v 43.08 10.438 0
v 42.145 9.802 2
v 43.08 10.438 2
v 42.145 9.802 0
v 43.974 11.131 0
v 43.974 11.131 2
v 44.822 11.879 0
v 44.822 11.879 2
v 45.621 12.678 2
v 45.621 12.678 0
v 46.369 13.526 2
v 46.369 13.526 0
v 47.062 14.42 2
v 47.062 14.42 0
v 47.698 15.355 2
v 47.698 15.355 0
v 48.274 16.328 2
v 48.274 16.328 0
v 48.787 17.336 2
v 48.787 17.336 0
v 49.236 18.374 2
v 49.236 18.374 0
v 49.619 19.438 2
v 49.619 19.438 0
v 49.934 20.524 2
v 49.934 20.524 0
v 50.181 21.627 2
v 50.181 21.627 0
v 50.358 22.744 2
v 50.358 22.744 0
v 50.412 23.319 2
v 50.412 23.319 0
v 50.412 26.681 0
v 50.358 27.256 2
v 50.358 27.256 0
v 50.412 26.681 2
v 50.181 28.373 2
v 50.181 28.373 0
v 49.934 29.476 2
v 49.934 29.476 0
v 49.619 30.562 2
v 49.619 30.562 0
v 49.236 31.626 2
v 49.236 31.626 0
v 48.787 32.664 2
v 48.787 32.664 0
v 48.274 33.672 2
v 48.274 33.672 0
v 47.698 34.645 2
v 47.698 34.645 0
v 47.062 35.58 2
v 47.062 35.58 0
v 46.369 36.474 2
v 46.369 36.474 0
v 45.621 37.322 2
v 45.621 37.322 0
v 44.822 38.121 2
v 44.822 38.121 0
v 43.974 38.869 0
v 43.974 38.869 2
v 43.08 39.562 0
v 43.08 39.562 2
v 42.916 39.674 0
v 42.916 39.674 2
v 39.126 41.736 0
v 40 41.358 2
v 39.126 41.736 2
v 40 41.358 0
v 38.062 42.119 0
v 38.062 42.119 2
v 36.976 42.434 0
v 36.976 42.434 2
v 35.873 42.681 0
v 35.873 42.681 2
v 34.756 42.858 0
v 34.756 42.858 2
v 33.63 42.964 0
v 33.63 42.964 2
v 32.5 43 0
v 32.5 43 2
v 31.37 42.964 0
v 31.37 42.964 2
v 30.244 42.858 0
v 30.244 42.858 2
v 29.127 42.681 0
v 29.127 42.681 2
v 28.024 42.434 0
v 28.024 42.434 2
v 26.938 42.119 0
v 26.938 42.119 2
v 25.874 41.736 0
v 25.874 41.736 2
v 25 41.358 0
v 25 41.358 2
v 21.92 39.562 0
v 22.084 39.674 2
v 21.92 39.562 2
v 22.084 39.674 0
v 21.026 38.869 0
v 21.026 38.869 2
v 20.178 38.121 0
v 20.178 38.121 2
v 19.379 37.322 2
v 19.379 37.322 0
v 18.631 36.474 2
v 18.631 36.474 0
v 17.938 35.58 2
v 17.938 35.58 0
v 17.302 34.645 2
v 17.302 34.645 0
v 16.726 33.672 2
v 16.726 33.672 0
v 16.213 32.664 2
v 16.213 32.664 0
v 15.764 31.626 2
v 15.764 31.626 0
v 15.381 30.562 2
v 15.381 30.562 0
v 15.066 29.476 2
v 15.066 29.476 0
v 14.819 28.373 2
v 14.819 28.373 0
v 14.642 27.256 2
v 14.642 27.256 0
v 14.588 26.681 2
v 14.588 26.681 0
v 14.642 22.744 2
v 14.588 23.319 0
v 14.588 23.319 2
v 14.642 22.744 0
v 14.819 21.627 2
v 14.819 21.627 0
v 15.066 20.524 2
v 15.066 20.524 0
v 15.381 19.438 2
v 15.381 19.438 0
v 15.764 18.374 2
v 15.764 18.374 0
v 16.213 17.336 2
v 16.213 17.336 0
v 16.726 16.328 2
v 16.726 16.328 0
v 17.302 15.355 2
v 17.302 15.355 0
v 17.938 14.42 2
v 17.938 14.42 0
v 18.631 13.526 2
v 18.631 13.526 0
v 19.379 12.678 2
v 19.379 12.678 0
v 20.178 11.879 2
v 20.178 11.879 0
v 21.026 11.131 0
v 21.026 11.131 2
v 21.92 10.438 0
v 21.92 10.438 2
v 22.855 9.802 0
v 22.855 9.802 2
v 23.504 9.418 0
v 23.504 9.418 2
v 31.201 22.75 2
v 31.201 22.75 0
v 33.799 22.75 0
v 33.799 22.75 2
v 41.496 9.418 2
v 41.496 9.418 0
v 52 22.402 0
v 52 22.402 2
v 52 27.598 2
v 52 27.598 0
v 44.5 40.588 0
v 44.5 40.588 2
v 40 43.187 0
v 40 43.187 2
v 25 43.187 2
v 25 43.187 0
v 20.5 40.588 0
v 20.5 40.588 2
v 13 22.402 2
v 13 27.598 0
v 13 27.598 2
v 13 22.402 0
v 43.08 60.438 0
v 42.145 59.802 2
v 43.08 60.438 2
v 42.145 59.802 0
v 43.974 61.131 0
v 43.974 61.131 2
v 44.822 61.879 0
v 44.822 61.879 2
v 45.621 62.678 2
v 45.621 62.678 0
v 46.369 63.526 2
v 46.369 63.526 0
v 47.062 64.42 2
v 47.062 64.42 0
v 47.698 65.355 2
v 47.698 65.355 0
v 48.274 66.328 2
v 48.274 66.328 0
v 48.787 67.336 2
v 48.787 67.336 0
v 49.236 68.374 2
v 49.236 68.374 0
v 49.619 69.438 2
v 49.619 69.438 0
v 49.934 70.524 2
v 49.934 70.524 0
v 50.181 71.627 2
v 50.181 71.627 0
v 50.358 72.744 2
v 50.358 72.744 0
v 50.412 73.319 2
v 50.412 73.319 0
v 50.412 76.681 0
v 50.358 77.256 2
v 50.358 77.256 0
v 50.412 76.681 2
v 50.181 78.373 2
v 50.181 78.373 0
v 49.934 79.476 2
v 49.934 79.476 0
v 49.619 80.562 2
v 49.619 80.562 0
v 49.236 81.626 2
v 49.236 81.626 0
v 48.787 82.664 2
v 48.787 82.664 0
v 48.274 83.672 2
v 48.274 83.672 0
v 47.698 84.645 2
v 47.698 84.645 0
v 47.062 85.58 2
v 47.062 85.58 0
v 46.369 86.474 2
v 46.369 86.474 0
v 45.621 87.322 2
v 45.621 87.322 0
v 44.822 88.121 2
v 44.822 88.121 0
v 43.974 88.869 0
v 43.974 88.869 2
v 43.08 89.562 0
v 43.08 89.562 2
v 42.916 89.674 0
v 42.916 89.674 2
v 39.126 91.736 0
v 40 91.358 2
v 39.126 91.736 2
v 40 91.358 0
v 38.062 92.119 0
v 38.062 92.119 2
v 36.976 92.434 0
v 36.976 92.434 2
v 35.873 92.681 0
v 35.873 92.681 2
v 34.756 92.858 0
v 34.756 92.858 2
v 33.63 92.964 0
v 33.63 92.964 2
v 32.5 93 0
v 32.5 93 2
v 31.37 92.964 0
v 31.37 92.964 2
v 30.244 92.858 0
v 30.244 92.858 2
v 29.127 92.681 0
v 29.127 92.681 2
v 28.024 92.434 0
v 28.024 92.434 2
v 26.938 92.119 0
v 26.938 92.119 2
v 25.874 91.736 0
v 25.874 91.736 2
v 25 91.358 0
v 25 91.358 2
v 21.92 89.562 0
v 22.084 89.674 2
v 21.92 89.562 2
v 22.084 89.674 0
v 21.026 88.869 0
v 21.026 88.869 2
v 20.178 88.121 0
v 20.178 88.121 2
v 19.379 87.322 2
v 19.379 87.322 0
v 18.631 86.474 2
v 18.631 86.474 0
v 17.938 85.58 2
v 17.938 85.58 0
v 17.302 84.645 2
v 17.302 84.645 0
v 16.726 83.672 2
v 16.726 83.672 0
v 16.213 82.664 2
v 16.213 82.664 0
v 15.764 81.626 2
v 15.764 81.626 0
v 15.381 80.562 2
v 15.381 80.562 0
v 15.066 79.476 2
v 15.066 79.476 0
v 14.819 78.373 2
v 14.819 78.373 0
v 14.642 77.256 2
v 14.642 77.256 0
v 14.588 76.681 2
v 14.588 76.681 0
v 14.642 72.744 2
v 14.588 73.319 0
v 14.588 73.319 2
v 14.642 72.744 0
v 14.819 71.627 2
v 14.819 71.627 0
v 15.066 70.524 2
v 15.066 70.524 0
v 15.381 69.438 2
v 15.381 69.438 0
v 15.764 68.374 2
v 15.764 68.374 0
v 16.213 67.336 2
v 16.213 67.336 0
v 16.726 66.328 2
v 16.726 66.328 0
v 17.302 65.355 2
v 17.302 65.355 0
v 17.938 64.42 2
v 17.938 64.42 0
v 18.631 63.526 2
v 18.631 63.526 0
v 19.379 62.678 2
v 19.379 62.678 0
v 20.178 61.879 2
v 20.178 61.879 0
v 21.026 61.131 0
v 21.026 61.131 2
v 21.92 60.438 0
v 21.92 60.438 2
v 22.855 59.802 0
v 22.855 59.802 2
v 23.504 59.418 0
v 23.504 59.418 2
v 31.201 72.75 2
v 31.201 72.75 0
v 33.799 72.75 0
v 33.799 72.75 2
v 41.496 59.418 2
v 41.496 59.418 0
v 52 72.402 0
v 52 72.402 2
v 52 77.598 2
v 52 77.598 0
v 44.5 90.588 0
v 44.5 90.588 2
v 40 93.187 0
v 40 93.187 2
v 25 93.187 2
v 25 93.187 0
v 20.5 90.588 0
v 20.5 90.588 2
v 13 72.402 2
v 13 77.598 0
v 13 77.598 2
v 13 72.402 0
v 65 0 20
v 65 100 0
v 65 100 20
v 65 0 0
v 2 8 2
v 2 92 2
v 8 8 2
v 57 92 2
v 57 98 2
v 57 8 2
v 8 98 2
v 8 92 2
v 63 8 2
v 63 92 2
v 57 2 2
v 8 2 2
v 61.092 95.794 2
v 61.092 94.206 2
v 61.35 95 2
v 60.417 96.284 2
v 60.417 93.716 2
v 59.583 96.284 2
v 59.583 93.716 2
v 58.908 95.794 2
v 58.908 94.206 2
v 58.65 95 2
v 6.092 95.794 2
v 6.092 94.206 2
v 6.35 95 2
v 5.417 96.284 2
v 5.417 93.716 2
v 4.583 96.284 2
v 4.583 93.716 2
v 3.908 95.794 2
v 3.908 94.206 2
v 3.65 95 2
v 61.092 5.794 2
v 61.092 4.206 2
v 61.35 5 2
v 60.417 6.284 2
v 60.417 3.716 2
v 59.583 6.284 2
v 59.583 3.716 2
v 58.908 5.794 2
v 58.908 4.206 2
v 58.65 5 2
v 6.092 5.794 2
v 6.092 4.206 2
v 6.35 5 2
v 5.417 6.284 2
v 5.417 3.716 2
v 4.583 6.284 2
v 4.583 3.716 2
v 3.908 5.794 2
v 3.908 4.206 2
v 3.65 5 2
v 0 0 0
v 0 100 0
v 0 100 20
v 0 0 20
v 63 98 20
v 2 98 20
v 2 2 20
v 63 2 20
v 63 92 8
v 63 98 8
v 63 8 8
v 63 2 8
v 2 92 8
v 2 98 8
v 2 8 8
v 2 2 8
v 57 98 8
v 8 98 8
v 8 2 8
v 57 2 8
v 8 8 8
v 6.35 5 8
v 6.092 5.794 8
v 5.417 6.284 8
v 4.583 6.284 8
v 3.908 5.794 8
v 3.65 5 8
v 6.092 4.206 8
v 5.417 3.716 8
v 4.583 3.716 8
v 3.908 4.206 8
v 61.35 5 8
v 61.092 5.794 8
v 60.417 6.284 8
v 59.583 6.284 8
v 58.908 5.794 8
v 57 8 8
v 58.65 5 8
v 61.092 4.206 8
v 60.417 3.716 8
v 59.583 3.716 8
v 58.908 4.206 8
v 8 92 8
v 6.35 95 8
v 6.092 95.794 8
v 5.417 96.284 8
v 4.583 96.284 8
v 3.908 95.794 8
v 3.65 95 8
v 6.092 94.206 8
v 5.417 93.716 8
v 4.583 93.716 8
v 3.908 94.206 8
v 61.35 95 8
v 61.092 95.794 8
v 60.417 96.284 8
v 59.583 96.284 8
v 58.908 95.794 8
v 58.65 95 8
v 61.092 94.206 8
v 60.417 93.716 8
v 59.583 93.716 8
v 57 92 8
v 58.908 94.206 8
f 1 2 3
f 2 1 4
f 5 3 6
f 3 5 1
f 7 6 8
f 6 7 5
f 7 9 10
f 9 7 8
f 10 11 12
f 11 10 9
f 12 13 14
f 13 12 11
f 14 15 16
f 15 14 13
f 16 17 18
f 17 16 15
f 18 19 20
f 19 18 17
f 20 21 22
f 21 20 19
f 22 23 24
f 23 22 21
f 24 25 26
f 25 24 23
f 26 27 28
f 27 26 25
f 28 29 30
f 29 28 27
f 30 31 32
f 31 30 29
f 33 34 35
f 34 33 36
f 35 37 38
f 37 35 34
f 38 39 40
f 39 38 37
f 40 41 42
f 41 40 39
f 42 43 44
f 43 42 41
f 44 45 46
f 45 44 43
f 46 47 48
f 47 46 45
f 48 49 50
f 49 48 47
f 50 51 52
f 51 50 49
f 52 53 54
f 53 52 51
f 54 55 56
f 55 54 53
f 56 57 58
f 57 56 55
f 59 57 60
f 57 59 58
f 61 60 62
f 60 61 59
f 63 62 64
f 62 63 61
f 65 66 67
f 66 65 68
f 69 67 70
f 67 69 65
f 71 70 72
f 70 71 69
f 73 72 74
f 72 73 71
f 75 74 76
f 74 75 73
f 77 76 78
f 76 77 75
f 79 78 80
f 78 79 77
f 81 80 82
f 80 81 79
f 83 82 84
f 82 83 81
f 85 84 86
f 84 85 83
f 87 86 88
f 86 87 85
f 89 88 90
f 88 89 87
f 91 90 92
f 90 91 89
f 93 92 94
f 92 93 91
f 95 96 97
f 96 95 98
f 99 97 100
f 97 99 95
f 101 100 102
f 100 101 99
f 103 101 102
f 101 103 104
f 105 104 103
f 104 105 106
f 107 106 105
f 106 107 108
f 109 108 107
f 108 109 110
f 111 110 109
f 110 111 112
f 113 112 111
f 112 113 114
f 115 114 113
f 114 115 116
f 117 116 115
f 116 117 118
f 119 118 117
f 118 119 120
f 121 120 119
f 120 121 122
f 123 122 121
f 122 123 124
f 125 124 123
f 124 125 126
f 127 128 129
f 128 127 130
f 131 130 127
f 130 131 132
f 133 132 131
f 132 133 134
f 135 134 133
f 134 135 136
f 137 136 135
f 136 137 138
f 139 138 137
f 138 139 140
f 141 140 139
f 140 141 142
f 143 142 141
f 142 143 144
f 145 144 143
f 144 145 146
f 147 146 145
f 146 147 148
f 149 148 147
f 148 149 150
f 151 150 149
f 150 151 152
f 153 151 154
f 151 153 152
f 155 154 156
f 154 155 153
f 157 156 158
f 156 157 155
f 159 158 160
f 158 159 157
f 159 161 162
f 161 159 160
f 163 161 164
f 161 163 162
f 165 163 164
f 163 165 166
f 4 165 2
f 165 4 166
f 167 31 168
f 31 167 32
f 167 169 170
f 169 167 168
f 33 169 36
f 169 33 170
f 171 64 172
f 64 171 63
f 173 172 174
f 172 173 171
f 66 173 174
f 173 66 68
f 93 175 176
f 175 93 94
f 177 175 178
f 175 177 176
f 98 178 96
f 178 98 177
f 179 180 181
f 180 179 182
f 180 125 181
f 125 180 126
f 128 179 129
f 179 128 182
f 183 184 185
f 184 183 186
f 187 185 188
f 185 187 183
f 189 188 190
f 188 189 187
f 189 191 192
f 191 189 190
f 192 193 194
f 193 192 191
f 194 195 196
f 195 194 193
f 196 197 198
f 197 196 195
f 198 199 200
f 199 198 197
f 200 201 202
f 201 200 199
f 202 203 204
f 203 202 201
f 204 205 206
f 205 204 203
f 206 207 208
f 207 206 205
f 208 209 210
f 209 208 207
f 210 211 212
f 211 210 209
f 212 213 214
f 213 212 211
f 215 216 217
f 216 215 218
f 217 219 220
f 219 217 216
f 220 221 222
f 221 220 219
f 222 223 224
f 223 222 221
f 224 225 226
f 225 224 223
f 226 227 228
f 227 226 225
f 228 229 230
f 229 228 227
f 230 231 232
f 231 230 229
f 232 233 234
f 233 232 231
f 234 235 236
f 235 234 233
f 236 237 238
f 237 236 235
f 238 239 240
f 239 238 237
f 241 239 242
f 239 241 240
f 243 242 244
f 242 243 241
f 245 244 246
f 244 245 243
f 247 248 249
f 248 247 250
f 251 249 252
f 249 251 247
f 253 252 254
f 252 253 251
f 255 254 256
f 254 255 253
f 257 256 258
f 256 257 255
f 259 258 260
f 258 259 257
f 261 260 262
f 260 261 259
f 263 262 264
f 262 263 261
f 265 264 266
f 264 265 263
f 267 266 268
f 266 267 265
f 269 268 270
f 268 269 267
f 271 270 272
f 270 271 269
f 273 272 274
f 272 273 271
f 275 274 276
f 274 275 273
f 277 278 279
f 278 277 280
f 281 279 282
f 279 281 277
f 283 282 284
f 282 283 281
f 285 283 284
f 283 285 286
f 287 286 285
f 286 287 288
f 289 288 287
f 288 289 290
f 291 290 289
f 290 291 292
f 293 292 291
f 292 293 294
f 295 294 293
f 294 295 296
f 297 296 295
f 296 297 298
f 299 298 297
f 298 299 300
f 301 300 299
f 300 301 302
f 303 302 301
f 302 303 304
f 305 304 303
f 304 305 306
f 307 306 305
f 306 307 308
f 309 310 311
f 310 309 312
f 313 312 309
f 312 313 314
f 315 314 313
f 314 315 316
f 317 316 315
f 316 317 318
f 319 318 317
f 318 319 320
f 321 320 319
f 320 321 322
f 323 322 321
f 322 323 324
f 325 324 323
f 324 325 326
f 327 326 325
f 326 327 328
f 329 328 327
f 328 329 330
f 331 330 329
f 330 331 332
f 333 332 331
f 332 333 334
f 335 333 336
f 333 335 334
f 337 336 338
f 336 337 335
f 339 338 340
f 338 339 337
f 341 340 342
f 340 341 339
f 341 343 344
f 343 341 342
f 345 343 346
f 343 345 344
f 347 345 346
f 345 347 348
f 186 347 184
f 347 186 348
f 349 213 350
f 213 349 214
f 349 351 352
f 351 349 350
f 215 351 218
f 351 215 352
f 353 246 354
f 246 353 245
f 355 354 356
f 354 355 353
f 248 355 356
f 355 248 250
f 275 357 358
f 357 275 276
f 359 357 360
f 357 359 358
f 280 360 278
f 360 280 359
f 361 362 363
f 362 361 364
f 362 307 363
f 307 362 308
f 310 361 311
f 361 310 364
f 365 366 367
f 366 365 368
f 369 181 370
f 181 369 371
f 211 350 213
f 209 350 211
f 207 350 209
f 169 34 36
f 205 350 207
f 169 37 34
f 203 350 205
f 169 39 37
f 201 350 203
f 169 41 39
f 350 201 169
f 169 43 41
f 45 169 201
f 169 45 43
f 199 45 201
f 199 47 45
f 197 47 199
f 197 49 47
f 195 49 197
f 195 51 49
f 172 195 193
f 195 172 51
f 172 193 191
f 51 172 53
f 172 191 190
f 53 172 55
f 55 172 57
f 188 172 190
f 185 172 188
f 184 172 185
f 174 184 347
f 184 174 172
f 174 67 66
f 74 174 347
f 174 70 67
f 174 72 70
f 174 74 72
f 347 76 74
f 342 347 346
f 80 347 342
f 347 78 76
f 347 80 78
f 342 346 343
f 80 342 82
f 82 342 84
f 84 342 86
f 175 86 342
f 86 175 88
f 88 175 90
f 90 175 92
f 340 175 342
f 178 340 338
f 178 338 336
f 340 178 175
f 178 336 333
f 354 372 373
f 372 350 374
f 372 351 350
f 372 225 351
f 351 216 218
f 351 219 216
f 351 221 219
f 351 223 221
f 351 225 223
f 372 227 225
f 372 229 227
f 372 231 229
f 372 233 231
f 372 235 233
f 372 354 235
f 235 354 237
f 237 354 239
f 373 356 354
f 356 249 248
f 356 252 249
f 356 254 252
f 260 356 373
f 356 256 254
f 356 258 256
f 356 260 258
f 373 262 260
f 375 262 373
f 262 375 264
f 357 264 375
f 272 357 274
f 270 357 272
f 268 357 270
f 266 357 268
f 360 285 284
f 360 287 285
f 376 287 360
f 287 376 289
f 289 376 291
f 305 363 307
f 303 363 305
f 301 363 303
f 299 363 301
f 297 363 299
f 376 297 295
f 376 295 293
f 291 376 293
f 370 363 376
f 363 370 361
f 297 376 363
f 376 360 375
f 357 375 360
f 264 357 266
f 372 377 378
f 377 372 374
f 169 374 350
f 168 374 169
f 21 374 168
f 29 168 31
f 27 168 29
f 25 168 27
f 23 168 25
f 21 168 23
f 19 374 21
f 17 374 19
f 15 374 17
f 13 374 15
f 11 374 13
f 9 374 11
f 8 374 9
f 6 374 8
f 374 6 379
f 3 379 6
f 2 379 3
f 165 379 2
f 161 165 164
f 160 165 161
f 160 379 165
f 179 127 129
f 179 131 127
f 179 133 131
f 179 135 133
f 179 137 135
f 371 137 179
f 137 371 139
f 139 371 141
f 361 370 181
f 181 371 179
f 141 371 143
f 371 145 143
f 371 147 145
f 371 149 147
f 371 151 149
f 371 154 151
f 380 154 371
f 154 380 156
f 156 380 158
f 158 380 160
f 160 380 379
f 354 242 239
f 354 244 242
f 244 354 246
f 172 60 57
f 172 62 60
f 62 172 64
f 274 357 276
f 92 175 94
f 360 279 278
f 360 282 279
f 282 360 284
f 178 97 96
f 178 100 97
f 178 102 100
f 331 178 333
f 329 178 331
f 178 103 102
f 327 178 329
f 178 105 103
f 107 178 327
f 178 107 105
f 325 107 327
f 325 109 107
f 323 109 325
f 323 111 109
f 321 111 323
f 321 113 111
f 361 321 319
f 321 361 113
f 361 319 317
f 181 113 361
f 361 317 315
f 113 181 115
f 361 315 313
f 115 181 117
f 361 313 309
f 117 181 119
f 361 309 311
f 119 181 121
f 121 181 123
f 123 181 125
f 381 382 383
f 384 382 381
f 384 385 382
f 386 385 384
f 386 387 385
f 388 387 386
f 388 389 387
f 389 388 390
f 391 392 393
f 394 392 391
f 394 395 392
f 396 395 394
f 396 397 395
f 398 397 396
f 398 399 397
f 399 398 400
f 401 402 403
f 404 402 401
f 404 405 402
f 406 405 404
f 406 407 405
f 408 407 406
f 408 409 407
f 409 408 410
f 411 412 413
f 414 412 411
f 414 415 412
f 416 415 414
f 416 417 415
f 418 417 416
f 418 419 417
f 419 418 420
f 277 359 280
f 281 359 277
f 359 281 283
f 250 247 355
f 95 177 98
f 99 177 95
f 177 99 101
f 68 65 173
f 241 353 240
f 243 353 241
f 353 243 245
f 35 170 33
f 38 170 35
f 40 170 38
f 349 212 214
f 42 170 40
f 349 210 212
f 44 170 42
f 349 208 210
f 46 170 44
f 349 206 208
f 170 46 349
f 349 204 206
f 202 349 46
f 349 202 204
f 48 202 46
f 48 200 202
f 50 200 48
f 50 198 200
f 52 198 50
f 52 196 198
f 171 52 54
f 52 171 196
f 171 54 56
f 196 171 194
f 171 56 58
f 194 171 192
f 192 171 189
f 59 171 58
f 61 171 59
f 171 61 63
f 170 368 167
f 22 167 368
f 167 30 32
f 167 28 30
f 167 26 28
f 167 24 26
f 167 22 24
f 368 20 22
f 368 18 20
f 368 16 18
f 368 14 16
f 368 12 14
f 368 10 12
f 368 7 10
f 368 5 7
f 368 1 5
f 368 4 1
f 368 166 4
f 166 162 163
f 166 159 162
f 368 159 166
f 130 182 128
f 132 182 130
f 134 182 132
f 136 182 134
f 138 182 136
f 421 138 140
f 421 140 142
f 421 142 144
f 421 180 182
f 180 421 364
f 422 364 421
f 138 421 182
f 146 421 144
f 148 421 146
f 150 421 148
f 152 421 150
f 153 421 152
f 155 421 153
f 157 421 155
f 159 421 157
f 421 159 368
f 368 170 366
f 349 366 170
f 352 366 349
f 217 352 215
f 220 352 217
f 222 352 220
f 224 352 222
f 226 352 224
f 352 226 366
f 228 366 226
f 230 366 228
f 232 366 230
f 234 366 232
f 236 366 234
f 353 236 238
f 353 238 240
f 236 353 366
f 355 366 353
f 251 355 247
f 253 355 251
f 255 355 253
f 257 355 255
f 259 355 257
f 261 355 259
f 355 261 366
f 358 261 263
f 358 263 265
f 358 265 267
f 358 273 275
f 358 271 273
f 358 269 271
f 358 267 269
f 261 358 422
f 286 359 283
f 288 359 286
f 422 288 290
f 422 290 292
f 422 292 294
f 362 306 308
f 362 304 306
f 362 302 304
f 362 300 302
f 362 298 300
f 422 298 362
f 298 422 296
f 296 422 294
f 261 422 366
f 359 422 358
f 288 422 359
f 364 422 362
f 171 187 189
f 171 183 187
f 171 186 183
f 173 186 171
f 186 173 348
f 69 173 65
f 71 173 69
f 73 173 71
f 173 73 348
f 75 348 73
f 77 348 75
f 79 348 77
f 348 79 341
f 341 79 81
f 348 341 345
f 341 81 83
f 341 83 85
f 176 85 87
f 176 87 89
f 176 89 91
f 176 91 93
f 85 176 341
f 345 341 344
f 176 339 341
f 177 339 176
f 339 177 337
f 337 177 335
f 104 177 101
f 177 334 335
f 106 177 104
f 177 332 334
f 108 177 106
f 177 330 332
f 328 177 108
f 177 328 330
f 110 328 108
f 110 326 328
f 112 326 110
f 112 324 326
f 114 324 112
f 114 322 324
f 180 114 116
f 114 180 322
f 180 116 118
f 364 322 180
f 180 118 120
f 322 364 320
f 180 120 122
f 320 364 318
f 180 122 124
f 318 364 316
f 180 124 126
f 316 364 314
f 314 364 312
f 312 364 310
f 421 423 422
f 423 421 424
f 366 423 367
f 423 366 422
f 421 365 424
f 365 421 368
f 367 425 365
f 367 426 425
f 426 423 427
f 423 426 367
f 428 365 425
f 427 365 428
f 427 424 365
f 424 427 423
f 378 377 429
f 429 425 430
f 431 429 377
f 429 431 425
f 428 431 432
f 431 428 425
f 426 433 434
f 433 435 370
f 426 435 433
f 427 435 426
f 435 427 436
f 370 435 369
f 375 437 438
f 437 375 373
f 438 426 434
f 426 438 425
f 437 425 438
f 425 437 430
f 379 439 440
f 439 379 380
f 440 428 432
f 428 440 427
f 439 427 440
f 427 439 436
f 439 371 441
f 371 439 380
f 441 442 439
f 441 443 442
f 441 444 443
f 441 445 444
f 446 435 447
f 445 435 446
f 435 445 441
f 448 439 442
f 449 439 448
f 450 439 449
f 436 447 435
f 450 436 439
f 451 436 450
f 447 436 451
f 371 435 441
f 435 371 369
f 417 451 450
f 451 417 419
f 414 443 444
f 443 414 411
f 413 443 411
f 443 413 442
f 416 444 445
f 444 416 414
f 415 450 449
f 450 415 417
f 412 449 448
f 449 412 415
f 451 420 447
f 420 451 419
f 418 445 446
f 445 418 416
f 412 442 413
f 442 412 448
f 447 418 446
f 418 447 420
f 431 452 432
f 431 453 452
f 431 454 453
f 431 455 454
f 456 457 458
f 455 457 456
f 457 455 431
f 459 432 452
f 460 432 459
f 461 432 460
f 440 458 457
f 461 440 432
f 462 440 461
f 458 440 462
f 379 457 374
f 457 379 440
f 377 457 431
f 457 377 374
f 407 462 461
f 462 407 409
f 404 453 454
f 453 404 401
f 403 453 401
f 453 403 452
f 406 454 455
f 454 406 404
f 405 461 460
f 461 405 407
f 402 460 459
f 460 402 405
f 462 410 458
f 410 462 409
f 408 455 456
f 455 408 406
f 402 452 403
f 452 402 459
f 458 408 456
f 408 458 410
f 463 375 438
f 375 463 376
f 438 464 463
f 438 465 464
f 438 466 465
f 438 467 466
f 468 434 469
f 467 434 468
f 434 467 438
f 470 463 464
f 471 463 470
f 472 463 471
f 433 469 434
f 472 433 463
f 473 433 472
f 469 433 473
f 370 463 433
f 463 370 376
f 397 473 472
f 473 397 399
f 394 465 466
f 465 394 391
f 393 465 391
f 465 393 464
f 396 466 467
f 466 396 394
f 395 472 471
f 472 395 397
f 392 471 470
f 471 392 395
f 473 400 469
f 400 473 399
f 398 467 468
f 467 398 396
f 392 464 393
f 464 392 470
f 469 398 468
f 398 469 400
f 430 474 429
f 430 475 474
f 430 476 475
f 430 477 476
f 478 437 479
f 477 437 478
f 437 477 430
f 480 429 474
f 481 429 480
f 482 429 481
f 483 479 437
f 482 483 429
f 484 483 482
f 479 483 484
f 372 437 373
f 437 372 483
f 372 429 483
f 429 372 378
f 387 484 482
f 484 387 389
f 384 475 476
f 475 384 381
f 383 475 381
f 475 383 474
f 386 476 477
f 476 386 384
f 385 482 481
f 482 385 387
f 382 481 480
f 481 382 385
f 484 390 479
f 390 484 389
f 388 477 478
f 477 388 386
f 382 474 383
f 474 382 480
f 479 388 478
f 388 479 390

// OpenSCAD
/*
// Simple DIY Electronic Music Projects
//    diyelectromusic.wordpress.com
//
// Forbidden Planet Krell Display
//    https://diyelectromusic.com/2025/01/25/forbidden-planet-krell-display/
//
      MIT License
      
      Copyright (c) 2025 diyelectromusic (Kevin)
      
      Permission is hereby granted, free of charge, to any person obtaining a copy of
      this software and associated documentation files (the "Software"), to deal in
      the Software without restriction, including without limitation the rights to
      use, copy, modify, merge, publish, distribute, sublicense, and/or sell copies of
      the Software, and to permit persons to whom the Software is furnished to do so,
      subject to the following conditions:
      
      The above copyright notice and this permission notice shall be included in all
      copies or substantial portions of the Software.
      
      THE SOFTWARE IS PROVIDED "AS IS", WITHOUT WARRANTY OF ANY KIND, EXPRESS OR
      IMPLIED, INCLUDING BUT NOT LIMITED TO THE WARRANTIES OF MERCHANTABILITY, FITNESS
      FOR A PARTICULAR PURPOSE AND NONINFRINGEMENT. IN NO EVENT SHALL THE AUTHORS OR
      COPYRIGHT HOLDERS BE LIABLE FOR ANY CLAIM, DAMAGES OR OTHER LIABILITY, WHETHERIN
      AN ACTION OF CONTRACT, TORT OR OTHERWISE, ARISING FROM, OUT OF OR IN CONNECTION
      WITH THE SOFTWARE OR THE USE OR OTHER DEALINGS IN THE SOFTWARE.
*/

box_l = 100;
box_w = 65;
box_h = 20;
box_th = 2;
dis_r = 18;
dis_h = 2;
dis_th = 1;
pcb_h = 6;       // Height of PCB from front
pcbfix_w = 6.0;
pcbfix_d = 2.7;  // M2.5 screws required
pcbfix_h = 6.0;  // 6mm depth screws
res = 20;

show_frame = 1;
show_quadframe = 0;
show_insert = 0;
show_support = 0;
show_quadsupport = 0;

if (show_frame) {
    difference () {
        cube([box_w, box_l, box_th]);
        union () {
            translate([0,0,-0.05]) {
                krell(box_w/2,box_l/4, dis_r, dis_h+0.1);
                krell(box_w/2,box_l*3/4, dis_r, dis_h+0.1);
            }
        }
    }
    difference() {
        cube([box_w, box_l, box_h]);
        translate([box_th,box_th,0]) {
            cube([box_w-2*box_th, box_l-2*box_th, box_h+0.1]);
        }
    }
    pcbfixing(box_th,box_th,box_th,pcb_h);
    pcbfixing(box_w-box_th-pcbfix_w,box_th,box_th,pcb_h);
    pcbfixing(box_th,box_l-box_th-pcbfix_w,box_th,pcb_h);
    pcbfixing(box_w-box_th-pcbfix_w,box_l-box_th-pcbfix_w,box_th,pcb_h);
}


if (show_quadframe) {
    translate([-box_w*3,0,0]) {
        difference () {
            cube([box_w*2, box_l, box_th]);
            union () {
                translate([0,0,-0.05]) {
                    krell(box_w/2,box_l/4, dis_r, dis_h+0.1);
                    krell(box_w/2,box_l*3/4, dis_r, dis_h+0.1);
                    krell(box_w*3/2,box_l/4, dis_r, dis_h+0.1);
                    krell(box_w*3/2,box_l*3/4, dis_r, dis_h+0.1);
                }
            }
        }
        difference() {
            cube([box_w*2, box_l, box_h]);
            translate([box_th,box_th,0]) {
                cube([box_w*2-2*box_th, box_l-2*box_th, box_h+0.1]);
            }
        }
        pcbfixing(box_th,box_th,box_th,pcb_h);
        pcbfixing(box_w-box_th-pcbfix_w,box_th,box_th,pcb_h);
        pcbfixing(box_th,box_l-box_th-pcbfix_w,box_th,pcb_h);
        pcbfixing(box_w-box_th-pcbfix_w,box_l-box_th-pcbfix_w,box_th,pcb_h);

        translate([box_w,0,0]) {
            pcbfixing(box_th,box_th,box_th,pcb_h);
            pcbfixing(box_w-box_th-pcbfix_w,box_th,box_th,pcb_h);
            pcbfixing(box_th,box_l-box_th-pcbfix_w,box_th,pcb_h);
            pcbfixing(box_w-box_th-pcbfix_w,box_l-box_th-pcbfix_w,box_th,pcb_h);
        }
    }
}


sup_l = (box_l/4) / cos(30);
sup_w = 1.0;
sup_h = box_h-10;
sup_fh = box_h-box_th-4; // NB: box_h is external height, so includes box_th
sup_d = 1.8;
if (show_support) {
    translate([0,-box_l*2,0]) {
        //translate([0,0,-box_th])
        //    cube([box_w, box_l, box_th]);

        difference () {
            union () {

                translate([box_w/2, box_l/4, 0]) {
                    supports();
                }

                translate([box_w/2, box_l*3/4, 0]) {
                    supports();
                }
                
                translate([0.1,box_l/2 - sup_w,0])
                    cube([box_w-0.2,sup_w*2,sup_fh]);
            }
            difference() {
                cube([box_w, box_l, box_h]);
                translate([box_th,box_th,0]) {
                    cube([box_w-2*box_th, box_l-2*box_th, box_h+0.1]);
                }
            }
        }
    }
}

if (show_quadsupport) {
    translate([0,-box_l*4,0]) {
        //translate([0,0,-box_th])
        //    cube([box_w*2, box_l, box_th]);

        difference () {
            union () {
                translate([box_w/2, box_l/4, 0]) {
                    supports();
                }

                translate([box_w/2, box_l*3/4, 0]) {
                    supports();
                }
                
                translate([box_w*3/2, box_l/4, 0]) {
                    supports();
                }

                translate([box_w*3/2, box_l*3/4, 0]) {
                    supports();
                }
                
                translate([0.1,box_l/2 - sup_w,0])
                    cube([box_w*2-0.2,sup_w*2,sup_fh]);

                translate([box_w,0.1,0])
                    cube([sup_w,box_l-box_th,sup_fh]);

            }
            difference() {
                cube([box_w*2, box_l, box_h]);
                translate([box_th,box_th,0]) {
                    cube([box_w*2-2*box_th, box_l-2*box_th, box_h+0.1]);
                }
            }
        }
    }
}


module supports () {
    difference() {
        union() {
            for(ang = [0 : 60: 360])
                rotate([0,0,ang]) {
                    translate([-sup_w/2,-sup_w/2,0]) {
                        difference() {
                            cube([sup_l,sup_w,sup_h]);
                            translate([9,-0.1,sup_h-1])
                                cube([3,sup_w+0.2,1.1]);
                        }
                    }
                    translate([12-sup_w/2,-sup_w/2,sup_h]) {
                        cube([sup_l-12,sup_w,sup_fh-sup_h]);
                    }
                }
        }
        translate([0,0,sup_h-2.0])
            cylinder(h=2.1,d=8);
    }
}


if (show_insert) {
    sph_r = 2;
    ins_r = dis_r+3;
    // Scale down slightly to give a bit of fitting tolerance
    //scale([0.98,0.98,1.0]) {
    {
        translate([box_w+10, 0, sph_r]) {
            // Packing of the circles:
            //   Horizontal distance = radius
            //   Vertical distance = radius * SQR(3)
            //   Every other row offset by 1 radius
            translate([0,0,-dis_th]) {
                difference() {
                    cube([ins_r*2,ins_r*2,dis_th]);
                    union() {
                        for(xpos = [sph_r:sph_r*2:ins_r*2-sph_r]) {
                            for (ypos = [sph_r:sph_r*2*sqrt(3):ins_r*2-sph_r]) {
                                translate([xpos,ypos,-sph_r/2-0.05]) {
                                    cylinder(sph_r+0.1,r=sph_r-0.5,$fn=res);
                                }
                                translate([xpos+sph_r,ypos+sph_r*sqrt(3),-sph_r/2-0.05]) {
                                    cylinder(sph_r+0.1,r=sph_r-0.5,$fn=res);
                                }
                            }
                        }
                    }
                }
            }
            difference() {
                union() {
                    for(xpos = [sph_r:sph_r*2:ins_r*2-sph_r]) {
                        for (ypos = [sph_r:sph_r*2*sqrt(3):ins_r*2-sph_r]) {
                            translate([xpos,ypos,0]) {
                                difference() {
                                    sphere(sph_r,$fn=res);
                                    union () {
                                        sphere(sph_r-0.5,$fn=res);
                                        translate([-sph_r,-sph_r,-sph_r-0.1])
                                            cube([sph_r*2, sph_r*2, sph_r]);
                                    }
                                }
                            }
                            translate([xpos+sph_r,ypos+sph_r*sqrt(3),0]) {
                                difference() {
                                    sphere(sph_r,$fn=res);
                                    union () {
                                        sphere(sph_r-0.5,$fn=res);
                                        translate([-sph_r,-sph_r,-sph_r-0.1])
                                            cube([sph_r*2, sph_r*2, sph_r]);
                                    }
                                }
                            }
                        }
                    }
                }
                difference () {
                    cube([ins_r*2, ins_r*2, 20]);
                    translate([0,0,-0.05]) {
                        krell(ins_r, ins_r, dis_r, 20+0.1);
                    }
                }
            }
            translate([ins_r, ins_r, 0]) {
                h = dis_h+0.1;
                krell_mark(h,0, 0.5);
                krell_mark(h,60, 0.5);
                krell_mark(h,120, 0.5);
                krell_mark(h,180, 0.5);
            }
        }
    }
}

module krell(x,y,r,h) {
    dis_arc = 15;
    translate([x, y, 0]) {
        linear_extrude(h) {
            arc(0,[-45-dis_arc,225+dis_arc],r,100);
            rd = r/4;
            translate([-rd/2, -rd/2, 0])
                square(rd);
        }
        krell_mark(h,0);
        krell_mark(h,60);
        krell_mark(h,120);
        krell_mark(h,180);
    }
}

module krell_mark(h,ang,tol=0) {
    rotate(ang)
        translate([dis_r, 0, 0])
            rotate([0,0,180])
                cylinder(h,d=(dis_r/3)-tol,$fn=3);
}

module pcbfixing (x,y,z,h) {
    translate ([x,y,z]) {
        difference() {
            cube([pcbfix_w, pcbfix_w, h]);
            translate ([pcbfix_w/2,pcbfix_w/2,h-pcbfix_h])
                cylinder(pcbfix_h+0.01,d=pcbfix_d,$fn=10);
        }
    }
}


// Taken from https://openhome.cc/eGossip/OpenSCAD/SectorArc.html
module sector(radius, angles, fn = 24) {
    r = radius / cos(180 / fn);
    step = -360 / fn;

    points = concat([[0, 0]],
        [for(a = [angles[0] : step : angles[1] - 360]) 
            [r * cos(a), r * sin(a)]
        ],
        [[r * cos(angles[1]), r * sin(angles[1])]]
    );

    difference() {
        circle(radius, $fn = fn);
        polygon(points);
    }
}

module arc(radius, angles, width = 1, fn = 24) {
    difference() {
        sector(radius + width, angles, fn);
        sector(radius, angles, fn);
    }
} 
